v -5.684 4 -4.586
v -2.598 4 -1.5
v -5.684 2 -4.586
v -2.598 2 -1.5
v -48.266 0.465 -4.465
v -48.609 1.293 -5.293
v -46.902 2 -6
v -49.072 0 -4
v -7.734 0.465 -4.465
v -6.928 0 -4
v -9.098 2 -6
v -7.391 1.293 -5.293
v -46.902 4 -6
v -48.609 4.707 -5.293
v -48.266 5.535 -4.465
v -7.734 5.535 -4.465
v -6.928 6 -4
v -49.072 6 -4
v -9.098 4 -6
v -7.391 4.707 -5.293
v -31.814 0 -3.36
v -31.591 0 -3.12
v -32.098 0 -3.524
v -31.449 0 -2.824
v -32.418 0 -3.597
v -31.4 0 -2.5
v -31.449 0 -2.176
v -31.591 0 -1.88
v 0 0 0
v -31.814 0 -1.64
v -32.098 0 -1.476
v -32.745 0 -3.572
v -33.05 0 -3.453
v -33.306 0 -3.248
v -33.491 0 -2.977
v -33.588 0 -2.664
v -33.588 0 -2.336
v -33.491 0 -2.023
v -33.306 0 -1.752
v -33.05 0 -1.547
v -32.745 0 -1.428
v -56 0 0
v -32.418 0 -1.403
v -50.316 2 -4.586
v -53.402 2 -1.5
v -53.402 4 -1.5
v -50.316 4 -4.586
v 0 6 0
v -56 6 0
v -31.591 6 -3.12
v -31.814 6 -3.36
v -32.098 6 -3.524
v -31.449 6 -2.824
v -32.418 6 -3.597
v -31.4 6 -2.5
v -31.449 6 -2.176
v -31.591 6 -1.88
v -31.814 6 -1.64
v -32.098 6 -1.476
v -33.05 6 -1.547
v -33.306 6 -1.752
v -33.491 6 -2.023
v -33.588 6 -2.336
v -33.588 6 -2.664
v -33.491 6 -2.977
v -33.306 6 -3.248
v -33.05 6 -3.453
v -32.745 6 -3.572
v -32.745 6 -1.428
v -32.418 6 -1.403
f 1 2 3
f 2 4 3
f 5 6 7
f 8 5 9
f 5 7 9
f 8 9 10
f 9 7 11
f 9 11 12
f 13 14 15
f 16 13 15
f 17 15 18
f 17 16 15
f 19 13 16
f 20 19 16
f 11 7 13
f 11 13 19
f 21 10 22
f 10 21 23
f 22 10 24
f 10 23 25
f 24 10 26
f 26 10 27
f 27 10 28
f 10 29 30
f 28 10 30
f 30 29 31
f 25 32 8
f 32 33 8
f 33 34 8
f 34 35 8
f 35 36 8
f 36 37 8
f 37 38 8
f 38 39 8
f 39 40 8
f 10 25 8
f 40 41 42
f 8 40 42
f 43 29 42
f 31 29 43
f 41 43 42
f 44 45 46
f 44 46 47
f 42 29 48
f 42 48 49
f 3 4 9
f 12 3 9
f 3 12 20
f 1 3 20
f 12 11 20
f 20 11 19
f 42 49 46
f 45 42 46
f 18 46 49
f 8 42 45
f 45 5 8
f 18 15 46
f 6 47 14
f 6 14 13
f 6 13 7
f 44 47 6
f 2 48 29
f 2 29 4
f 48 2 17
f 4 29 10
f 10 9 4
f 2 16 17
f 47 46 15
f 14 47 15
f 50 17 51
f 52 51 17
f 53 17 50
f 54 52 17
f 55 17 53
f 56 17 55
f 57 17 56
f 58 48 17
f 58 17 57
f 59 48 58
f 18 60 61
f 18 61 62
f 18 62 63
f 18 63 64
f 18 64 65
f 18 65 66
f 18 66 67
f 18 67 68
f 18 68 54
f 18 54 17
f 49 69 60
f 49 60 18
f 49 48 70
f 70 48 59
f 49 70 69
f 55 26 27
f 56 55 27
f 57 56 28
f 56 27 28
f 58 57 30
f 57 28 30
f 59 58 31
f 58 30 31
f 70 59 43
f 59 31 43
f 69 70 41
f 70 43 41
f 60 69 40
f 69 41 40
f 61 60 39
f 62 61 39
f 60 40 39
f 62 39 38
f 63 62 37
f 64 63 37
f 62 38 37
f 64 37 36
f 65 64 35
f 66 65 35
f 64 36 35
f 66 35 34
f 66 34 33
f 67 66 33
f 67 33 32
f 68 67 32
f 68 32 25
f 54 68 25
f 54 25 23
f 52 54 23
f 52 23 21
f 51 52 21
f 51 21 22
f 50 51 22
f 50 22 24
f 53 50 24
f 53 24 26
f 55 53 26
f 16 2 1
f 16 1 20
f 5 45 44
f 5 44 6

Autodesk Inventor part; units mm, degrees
ref_plane "YZ Plane" through (0, 0, 0) normal (1, 0, 0) x (0, 1, 0)
ref_plane "XZ Plane" through (0, 0, 0) normal (0, 1, 0) x (-1, 0, 0)
ref_plane "XY Plane" through (0, 0, 0) normal (0, 0, 1) x (1, 0, 0)
sketch "Sketch1" plane through (0, 0, 0) normal (0, 1, 0) x (-1, 0, 0)
  line L0 (0, 0) -> (56, 0)
  line L1 (56, 0) -> (54.5, 0)
  line L2 (56, 0) -> (21.359, -20)
  line L3 (56, 0) -> (96, 0) construction
  line L4 (28, 0) -> (28, 5.9969)
  line L5 (0, 0) -> (34.641, -20)
  line L6 (28, 0) -> (28, -6)
  line L7 (28, -6) -> (78, -6)
  line L8 (28, -6) -> (-22, -6)
  line L9 (56, 0) -> (53.4019, -1.5)
  line L10 (53.4019, -1.5) -> (39.2598, -15.6421)
  line L11 (53.4019, -1.5) -> (73.4019, -1.5) construction
  line L12 (2.5981, -1.5) -> (16.7402, -15.6421)
  point P0 (48.9019, -6)
  point P1 (7.0981, -6)
  dimension "d0" = 56
  dimension "d3" = 40
  dimension "d4" = 150
  dimension "d5" = 6
  dimension "d6" = 50
  dimension "d7" = 50
  dimension "d8" = 3
  dimension "d9" = 20
  dimension "d10" = 135
extrude "Extrusion1" add sketch "Sketch1" along normal blind 6 contours L0 L6 L8 L5 | L0 L2 L7 L6 | L5 L8 L12 | L2 L10 L7
chamfer "Chamfer1" distance 2 angle 45 6 edges at (-48.9019, 3, -6) (-51.1519, 6, -3.75) (-51.1519, 0, -3.75) (-4.8481, 0, -3.75) (-7.0981, 3, -6) (-4.8481, 6, -3.75)
chamfer "Chamfer2" distance 2 angle 45 2 edges at (-37.0367, 0, -6) (-37.0367, 6, -6)
sketch "Sketch3" plane through (0, 0, 0) normal (0, -1, 0) x (1, 0, 0)
  line L0 (-49.0718, -4) -> (-56, 0) projected
  line L1 (-56, 0) -> (-32.5, 0)
  line L2 (-56, 0) -> (0, 0) projected
  line L3 (-32.5, 0) -> (-32.5, -2.5)
  line L4 (-6.9282, -4) -> (-49.0718, -4) projected
  circle A0 centre (-32.5, -2.5) radius 1.1
  dimension "d25" = 23.5
  dimension "d26" = 2.5
  dimension "d27" = 2.2
extrude "Extrusion3" cut sketch "Sketch3" against normal blind 50
properties part number "parallel_bar_long_hole_v1"
